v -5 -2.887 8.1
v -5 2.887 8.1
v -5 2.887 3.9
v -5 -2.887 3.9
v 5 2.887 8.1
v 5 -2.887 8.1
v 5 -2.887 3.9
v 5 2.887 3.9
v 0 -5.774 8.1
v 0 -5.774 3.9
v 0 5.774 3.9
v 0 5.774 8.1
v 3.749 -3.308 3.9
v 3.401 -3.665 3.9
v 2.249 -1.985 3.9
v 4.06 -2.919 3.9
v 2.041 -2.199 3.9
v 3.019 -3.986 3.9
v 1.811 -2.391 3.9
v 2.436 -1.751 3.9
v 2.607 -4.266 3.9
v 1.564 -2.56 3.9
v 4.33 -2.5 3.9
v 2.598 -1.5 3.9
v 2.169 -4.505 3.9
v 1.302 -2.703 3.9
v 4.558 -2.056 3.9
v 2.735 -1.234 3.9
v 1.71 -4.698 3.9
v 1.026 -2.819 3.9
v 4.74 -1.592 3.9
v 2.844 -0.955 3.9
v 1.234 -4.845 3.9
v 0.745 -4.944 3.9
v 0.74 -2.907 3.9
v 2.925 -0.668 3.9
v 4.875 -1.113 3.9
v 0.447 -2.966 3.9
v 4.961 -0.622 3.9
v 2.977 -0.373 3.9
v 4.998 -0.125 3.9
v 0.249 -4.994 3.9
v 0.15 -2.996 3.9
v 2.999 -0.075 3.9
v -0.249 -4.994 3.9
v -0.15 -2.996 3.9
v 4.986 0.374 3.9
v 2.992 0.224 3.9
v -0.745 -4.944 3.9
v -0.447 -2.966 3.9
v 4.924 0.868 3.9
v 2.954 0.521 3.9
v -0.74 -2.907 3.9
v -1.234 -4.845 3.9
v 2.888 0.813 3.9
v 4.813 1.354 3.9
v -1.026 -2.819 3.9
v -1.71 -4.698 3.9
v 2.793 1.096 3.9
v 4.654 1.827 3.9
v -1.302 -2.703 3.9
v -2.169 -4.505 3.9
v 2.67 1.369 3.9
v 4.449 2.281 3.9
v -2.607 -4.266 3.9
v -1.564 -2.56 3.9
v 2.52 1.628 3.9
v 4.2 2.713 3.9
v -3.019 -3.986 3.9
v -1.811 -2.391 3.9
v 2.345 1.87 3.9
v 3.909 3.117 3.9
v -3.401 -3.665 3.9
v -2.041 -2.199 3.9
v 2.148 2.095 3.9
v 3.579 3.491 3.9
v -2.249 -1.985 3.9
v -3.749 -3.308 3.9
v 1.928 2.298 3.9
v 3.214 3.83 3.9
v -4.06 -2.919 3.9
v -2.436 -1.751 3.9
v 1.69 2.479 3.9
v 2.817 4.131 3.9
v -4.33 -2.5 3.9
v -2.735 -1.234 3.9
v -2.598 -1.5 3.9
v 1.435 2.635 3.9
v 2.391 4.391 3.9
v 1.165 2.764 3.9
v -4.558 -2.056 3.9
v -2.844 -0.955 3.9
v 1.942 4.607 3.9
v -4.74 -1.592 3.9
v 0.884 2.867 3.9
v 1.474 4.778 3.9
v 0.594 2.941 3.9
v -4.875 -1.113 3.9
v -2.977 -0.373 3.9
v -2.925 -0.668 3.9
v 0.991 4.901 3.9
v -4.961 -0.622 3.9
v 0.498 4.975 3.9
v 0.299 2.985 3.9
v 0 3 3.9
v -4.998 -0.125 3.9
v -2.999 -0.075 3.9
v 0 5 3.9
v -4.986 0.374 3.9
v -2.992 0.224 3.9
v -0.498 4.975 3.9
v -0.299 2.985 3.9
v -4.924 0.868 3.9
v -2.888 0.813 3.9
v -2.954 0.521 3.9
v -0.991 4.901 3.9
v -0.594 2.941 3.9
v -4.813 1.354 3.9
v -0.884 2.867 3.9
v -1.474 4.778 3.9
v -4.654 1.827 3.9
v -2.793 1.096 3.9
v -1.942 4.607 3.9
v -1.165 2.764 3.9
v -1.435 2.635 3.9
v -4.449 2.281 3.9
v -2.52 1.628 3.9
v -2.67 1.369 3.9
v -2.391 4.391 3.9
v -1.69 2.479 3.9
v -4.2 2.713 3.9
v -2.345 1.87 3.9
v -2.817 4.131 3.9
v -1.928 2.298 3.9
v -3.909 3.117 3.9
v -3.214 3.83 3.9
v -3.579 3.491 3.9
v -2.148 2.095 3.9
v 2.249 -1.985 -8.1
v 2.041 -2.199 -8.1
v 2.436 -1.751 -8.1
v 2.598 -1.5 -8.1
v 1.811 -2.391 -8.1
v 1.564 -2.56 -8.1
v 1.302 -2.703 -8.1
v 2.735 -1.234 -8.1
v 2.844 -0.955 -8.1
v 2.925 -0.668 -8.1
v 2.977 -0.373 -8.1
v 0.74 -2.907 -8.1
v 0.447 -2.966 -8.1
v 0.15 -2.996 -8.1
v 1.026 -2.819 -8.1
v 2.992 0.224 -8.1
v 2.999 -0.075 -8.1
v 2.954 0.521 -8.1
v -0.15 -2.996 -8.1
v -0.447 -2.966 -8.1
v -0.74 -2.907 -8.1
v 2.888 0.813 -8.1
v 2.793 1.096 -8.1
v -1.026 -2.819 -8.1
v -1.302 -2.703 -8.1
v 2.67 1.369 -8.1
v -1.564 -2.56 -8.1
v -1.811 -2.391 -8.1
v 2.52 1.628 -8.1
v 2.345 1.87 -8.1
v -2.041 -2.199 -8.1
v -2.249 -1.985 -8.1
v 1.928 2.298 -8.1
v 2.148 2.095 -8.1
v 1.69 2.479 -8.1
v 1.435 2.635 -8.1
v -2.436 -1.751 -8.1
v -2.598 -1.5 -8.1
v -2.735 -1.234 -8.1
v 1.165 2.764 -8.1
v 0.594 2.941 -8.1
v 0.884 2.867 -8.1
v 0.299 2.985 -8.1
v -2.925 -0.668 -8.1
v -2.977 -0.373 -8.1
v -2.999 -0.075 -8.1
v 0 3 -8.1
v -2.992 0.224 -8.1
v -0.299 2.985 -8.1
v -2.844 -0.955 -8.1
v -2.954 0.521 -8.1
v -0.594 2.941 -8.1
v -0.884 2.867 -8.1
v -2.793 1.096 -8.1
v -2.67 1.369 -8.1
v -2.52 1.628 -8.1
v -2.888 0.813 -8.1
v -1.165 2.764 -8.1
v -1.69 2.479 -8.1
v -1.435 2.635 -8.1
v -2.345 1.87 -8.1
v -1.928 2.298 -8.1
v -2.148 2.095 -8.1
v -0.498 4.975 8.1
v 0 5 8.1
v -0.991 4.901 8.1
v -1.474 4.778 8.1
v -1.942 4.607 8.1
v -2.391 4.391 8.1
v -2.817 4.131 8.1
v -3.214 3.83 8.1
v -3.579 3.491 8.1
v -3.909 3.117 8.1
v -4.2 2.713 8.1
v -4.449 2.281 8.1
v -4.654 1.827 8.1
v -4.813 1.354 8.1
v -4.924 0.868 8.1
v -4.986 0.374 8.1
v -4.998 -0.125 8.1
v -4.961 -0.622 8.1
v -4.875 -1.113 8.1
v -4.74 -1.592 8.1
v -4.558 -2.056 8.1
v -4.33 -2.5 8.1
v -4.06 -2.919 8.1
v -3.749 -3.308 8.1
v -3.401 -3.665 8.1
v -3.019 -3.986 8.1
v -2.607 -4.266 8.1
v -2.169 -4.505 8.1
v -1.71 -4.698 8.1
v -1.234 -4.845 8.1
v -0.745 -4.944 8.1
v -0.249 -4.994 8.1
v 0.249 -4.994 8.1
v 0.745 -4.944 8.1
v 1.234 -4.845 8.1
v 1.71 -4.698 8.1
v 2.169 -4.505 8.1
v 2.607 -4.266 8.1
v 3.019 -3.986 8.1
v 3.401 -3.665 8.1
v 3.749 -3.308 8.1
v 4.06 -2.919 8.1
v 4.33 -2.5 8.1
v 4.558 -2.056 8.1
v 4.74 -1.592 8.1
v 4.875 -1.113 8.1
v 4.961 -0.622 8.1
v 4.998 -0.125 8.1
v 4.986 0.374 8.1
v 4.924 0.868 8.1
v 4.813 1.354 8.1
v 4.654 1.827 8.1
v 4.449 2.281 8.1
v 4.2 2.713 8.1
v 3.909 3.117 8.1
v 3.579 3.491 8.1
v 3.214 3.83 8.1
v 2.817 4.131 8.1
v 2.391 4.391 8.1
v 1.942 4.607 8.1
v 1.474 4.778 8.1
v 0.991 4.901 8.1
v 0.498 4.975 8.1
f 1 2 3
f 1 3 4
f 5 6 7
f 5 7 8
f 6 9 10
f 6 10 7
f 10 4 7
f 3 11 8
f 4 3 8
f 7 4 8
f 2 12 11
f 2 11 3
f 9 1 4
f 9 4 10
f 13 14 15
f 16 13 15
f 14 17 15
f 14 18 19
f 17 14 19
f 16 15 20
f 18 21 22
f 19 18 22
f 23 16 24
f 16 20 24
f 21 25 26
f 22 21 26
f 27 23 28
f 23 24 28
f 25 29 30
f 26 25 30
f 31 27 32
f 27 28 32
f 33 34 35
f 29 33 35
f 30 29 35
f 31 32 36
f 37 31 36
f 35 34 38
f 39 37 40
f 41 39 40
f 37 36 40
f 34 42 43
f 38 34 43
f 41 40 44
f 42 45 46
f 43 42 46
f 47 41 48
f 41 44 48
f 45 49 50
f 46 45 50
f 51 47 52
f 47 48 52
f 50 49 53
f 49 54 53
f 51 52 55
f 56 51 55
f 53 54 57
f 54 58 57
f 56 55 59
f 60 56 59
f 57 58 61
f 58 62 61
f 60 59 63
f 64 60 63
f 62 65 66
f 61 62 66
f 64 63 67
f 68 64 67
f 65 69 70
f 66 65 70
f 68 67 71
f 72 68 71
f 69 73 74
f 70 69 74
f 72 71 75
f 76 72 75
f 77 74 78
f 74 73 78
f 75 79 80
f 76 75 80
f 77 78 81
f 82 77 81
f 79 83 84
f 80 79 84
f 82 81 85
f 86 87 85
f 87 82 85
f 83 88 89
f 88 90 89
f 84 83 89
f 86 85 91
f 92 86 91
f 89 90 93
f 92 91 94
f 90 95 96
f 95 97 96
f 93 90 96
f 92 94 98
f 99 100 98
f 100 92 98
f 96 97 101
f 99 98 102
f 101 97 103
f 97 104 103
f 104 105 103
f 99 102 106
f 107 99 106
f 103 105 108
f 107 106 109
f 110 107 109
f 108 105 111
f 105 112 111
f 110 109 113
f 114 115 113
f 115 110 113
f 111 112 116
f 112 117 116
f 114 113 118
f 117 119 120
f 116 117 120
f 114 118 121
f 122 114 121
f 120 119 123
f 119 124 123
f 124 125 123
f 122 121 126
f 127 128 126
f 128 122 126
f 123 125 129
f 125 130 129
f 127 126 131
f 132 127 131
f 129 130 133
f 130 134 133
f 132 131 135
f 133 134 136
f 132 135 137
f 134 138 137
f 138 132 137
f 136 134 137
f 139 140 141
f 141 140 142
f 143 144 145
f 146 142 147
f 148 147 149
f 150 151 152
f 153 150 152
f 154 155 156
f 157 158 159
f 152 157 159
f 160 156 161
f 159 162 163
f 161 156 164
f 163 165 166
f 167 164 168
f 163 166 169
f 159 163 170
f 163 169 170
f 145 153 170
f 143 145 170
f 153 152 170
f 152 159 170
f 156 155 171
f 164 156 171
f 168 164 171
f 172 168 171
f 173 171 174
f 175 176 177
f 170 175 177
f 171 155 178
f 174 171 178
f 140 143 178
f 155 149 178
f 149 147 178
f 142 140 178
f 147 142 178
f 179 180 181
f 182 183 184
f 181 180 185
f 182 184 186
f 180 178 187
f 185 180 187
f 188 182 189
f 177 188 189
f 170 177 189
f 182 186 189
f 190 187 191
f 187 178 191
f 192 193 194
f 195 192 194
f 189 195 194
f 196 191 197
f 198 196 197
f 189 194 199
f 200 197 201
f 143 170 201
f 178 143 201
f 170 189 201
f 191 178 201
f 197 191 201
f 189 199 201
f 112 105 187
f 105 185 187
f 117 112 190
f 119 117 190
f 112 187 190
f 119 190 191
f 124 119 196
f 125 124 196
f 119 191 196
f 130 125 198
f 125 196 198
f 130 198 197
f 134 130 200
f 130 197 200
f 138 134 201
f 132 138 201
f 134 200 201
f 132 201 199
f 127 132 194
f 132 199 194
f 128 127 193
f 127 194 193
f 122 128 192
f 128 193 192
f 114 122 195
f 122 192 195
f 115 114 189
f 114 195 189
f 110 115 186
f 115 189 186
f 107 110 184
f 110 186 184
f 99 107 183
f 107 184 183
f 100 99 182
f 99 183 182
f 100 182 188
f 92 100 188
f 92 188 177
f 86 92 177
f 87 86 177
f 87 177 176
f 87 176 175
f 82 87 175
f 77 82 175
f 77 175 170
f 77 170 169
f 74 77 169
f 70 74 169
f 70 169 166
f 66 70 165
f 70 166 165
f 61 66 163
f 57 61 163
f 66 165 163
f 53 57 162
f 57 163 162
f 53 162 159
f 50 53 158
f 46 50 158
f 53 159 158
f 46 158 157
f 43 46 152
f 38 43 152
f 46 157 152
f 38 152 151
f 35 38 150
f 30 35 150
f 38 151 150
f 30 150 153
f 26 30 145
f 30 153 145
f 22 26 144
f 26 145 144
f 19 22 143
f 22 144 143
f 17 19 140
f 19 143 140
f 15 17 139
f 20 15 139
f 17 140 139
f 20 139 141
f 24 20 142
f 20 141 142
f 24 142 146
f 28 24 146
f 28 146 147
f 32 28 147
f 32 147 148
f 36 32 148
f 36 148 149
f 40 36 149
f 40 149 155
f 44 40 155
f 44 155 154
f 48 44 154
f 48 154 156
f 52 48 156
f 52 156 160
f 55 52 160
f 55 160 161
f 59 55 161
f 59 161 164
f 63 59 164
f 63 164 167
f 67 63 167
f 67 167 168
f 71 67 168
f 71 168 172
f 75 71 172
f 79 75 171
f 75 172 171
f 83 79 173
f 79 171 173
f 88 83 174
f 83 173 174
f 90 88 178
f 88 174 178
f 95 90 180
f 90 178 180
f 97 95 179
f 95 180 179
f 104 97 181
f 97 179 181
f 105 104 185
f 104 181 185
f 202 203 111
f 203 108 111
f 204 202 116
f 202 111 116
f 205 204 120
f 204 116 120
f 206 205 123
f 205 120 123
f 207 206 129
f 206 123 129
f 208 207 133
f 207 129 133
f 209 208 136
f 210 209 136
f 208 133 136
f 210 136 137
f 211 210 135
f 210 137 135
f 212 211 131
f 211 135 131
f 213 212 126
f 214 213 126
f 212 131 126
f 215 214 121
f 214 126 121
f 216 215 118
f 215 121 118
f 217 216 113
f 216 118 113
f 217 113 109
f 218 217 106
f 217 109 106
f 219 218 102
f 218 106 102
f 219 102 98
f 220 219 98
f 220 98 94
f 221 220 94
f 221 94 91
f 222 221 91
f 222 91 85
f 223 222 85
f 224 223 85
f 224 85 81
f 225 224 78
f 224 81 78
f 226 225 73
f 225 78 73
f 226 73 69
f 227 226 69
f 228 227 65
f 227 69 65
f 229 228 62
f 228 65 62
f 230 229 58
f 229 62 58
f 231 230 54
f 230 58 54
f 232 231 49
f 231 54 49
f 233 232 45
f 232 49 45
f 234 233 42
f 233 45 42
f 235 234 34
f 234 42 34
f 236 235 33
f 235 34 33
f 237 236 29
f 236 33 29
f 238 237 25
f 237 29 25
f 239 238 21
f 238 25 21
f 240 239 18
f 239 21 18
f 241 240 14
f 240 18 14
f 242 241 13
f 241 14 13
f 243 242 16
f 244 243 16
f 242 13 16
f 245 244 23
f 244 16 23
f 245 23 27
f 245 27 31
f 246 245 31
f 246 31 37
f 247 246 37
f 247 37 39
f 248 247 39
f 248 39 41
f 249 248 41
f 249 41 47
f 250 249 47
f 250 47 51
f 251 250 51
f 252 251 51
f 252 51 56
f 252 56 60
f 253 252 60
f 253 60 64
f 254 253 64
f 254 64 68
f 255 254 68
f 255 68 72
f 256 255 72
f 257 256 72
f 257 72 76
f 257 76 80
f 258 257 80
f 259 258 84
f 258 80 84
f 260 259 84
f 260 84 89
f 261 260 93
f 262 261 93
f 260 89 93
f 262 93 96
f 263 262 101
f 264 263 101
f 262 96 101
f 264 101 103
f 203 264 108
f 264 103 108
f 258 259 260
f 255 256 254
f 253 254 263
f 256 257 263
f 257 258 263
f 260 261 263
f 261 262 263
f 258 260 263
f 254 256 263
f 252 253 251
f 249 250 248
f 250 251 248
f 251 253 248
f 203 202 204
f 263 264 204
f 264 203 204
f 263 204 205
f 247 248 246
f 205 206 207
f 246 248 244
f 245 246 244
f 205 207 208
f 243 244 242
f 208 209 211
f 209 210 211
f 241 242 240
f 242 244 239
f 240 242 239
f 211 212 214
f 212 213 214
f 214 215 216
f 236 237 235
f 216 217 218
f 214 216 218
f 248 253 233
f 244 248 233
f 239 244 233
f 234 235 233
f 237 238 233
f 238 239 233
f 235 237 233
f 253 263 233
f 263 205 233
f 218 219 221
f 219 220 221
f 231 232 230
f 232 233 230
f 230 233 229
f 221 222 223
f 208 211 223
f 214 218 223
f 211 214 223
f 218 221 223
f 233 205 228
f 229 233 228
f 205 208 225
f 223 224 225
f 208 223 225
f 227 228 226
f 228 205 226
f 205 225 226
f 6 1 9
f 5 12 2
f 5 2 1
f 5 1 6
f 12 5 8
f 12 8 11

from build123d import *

# Parameters (mm, degrees)
BOSS_EXTRUDE1_DEPTH = 4.2


with BuildPart() as part:
    # Sketch2 → Revolve1 (revolve)
    with BuildSketch(Plane(origin=(0, 0, 0), x_dir=(0, 0, -1), z_dir=(1, 0, 0))):
        Polygon((8.1, 0), (-8.1, 0), (-8.1, 5), (-3.9, 5), (-3.9, 3), (8.1, 3), align=None)
    revolve(axis=Axis((0, 0, -8.1), (0, 0, 1)))


with BuildPart() as body_2:
    # Sketch3 → Boss-Extrude1 (new body)
    with BuildSketch(Plane.XY.offset(8.1)):
        Polygon((0, 5.773502692), (-5, 2.886751346), (-5, -2.886751346), (0, -5.773502692), (5, -2.886751346), (5, 2.886751346), align=None)
    extrude(amount=-BOSS_EXTRUDE1_DEPTH)


solid = Compound([part.part, body_2.part])
